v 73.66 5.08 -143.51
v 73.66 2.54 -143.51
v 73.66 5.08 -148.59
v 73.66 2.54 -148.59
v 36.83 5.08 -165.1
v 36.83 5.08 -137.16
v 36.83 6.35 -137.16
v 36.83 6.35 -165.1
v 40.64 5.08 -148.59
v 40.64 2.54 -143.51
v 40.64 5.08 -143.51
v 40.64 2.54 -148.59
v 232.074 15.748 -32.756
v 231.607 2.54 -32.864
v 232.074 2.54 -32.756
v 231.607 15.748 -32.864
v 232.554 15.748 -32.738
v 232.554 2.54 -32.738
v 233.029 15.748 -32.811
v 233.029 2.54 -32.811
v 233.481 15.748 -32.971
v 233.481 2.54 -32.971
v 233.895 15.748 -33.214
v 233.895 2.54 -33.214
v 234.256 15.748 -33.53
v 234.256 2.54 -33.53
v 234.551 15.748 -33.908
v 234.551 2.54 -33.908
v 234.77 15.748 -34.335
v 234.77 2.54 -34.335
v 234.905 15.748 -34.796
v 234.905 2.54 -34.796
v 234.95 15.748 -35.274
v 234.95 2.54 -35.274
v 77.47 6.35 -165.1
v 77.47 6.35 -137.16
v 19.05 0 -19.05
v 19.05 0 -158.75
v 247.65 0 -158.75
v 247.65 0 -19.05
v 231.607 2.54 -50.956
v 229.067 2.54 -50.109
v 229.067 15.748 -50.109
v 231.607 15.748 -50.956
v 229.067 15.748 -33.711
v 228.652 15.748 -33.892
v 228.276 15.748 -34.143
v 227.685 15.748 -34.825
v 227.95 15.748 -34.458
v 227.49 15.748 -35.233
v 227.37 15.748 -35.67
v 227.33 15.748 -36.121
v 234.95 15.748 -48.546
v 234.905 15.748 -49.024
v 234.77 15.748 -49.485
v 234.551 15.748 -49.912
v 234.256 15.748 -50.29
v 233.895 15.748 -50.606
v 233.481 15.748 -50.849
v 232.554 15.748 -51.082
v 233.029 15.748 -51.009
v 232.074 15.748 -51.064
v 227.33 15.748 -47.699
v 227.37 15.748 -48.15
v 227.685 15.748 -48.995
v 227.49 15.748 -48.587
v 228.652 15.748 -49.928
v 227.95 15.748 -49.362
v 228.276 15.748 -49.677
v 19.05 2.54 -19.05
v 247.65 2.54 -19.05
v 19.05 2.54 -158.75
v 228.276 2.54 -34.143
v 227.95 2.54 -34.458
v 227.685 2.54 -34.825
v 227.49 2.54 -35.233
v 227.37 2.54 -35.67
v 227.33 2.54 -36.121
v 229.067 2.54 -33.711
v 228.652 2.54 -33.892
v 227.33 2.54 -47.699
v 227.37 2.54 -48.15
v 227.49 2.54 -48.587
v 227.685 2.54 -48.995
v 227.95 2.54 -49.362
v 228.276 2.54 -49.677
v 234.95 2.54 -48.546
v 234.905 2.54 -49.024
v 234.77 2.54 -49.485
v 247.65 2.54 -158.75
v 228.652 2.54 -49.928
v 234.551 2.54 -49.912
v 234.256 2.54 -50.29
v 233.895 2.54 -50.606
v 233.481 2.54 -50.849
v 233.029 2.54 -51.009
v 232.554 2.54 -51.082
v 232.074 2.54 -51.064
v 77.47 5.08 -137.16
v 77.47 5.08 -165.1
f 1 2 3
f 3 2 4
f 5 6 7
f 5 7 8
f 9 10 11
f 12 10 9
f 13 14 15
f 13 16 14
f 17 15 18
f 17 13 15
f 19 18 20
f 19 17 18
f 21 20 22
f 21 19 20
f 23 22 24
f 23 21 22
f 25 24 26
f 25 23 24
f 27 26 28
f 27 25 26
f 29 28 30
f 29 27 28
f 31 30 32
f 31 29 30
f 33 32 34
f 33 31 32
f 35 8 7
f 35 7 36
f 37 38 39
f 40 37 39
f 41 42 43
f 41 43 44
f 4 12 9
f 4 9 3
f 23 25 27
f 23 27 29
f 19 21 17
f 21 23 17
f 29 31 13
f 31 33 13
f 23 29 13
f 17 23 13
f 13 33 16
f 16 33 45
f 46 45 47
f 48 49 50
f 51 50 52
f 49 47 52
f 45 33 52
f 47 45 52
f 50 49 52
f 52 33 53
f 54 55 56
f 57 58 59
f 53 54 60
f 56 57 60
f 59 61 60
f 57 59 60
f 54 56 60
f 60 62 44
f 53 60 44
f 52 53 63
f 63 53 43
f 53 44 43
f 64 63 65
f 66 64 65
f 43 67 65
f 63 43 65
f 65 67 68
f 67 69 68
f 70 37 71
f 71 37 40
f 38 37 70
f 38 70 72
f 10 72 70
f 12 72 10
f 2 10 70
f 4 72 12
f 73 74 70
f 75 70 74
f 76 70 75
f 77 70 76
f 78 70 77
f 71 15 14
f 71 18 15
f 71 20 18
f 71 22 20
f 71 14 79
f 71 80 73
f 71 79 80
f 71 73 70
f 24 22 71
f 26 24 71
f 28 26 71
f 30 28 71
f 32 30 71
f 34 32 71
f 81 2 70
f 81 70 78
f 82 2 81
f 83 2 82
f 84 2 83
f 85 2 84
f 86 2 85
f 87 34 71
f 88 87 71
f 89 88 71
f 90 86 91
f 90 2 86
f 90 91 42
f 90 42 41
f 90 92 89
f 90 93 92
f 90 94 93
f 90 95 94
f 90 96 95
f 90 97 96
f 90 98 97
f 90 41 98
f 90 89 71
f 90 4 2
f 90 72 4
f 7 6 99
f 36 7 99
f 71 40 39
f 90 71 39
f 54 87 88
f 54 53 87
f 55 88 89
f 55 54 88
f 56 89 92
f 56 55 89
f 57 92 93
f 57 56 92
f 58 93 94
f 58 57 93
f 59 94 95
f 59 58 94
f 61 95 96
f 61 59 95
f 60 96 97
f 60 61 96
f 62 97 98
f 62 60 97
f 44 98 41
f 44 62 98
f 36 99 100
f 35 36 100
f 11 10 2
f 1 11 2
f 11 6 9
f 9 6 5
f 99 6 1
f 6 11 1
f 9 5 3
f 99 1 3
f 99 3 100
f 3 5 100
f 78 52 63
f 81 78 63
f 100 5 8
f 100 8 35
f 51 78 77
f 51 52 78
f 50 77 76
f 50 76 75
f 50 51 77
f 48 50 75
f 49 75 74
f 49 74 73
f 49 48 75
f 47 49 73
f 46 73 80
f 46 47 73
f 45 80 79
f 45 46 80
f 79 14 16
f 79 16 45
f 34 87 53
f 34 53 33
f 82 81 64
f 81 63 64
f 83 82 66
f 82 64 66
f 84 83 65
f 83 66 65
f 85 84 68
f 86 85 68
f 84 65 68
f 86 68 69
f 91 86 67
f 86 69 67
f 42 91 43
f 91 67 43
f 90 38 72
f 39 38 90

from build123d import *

# Parameters (mm, degrees)
SKETCH4_W           = 228.6
SKETCH4_H           = 139.7
BOSS_EXTRUDE3_DEPTH = 2.54
SKETCH5_W           = 33.02
SKETCH5_H           = 5.08
BOSS_EXTRUDE4_DEPTH = 2.54
SKETCH6_W           = 40.64
SKETCH6_H           = 27.94
BOSS_EXTRUDE5_DEPTH = 1.27
BOSS_EXTRUDE7_DEPTH = 13.208
FILLET1_R           = 2.54


with BuildPart() as part:
    # Sketch4 → Boss-Extrude3 (new body)
    with BuildSketch(Plane(origin=(0, 0, 0), x_dir=(1, 0, 0), z_dir=(0, 1, 0))):
        with Locations((133.35, 88.9)):
            Rectangle(SKETCH4_W, SKETCH4_H)
    extrude(amount=BOSS_EXTRUDE3_DEPTH)

    # Sketch5 → Boss-Extrude4 (add)
    with BuildSketch(Plane(origin=(0, 2.54, 0), x_dir=(1, 0, 0), z_dir=(0, 1, 0))):
        with Locations((57.15, 146.05)):
            Rectangle(SKETCH5_W, SKETCH5_H)
    extrude(amount=BOSS_EXTRUDE4_DEPTH)

    # Sketch6 → Boss-Extrude5 (add)
    with BuildSketch(Plane(origin=(0, 5.08, 0), x_dir=(1, 0, 0), z_dir=(0, 1, 0))):
        with Locations((57.15, 151.13)):
            Rectangle(SKETCH6_W, SKETCH6_H)
    extrude(amount=BOSS_EXTRUDE5_DEPTH)

    # Sketch8 → Boss-Extrude7 (add)
    with BuildSketch(Plane(origin=(0, 2.54, 0), x_dir=(1, 0, 0), z_dir=(0, 1, 0))):
        Polygon((227.33, 49.53), (234.95, 52.07), (234.95, 31.75), (227.33, 34.29), align=None)
    extrude(amount=BOSS_EXTRUDE7_DEPTH)

    # Fillet1
    fillet1_edges = [part.edges().sort_by_distance(p)[0] for p in [
        (227.33, 9.144, -49.53),
        (227.33, 9.144, -34.29),
        (234.95, 9.144, -31.75),
        (234.95, 9.144, -52.07),
    ]]
    fillet(fillet1_edges, radius=FILLET1_R)


solid = part.part
